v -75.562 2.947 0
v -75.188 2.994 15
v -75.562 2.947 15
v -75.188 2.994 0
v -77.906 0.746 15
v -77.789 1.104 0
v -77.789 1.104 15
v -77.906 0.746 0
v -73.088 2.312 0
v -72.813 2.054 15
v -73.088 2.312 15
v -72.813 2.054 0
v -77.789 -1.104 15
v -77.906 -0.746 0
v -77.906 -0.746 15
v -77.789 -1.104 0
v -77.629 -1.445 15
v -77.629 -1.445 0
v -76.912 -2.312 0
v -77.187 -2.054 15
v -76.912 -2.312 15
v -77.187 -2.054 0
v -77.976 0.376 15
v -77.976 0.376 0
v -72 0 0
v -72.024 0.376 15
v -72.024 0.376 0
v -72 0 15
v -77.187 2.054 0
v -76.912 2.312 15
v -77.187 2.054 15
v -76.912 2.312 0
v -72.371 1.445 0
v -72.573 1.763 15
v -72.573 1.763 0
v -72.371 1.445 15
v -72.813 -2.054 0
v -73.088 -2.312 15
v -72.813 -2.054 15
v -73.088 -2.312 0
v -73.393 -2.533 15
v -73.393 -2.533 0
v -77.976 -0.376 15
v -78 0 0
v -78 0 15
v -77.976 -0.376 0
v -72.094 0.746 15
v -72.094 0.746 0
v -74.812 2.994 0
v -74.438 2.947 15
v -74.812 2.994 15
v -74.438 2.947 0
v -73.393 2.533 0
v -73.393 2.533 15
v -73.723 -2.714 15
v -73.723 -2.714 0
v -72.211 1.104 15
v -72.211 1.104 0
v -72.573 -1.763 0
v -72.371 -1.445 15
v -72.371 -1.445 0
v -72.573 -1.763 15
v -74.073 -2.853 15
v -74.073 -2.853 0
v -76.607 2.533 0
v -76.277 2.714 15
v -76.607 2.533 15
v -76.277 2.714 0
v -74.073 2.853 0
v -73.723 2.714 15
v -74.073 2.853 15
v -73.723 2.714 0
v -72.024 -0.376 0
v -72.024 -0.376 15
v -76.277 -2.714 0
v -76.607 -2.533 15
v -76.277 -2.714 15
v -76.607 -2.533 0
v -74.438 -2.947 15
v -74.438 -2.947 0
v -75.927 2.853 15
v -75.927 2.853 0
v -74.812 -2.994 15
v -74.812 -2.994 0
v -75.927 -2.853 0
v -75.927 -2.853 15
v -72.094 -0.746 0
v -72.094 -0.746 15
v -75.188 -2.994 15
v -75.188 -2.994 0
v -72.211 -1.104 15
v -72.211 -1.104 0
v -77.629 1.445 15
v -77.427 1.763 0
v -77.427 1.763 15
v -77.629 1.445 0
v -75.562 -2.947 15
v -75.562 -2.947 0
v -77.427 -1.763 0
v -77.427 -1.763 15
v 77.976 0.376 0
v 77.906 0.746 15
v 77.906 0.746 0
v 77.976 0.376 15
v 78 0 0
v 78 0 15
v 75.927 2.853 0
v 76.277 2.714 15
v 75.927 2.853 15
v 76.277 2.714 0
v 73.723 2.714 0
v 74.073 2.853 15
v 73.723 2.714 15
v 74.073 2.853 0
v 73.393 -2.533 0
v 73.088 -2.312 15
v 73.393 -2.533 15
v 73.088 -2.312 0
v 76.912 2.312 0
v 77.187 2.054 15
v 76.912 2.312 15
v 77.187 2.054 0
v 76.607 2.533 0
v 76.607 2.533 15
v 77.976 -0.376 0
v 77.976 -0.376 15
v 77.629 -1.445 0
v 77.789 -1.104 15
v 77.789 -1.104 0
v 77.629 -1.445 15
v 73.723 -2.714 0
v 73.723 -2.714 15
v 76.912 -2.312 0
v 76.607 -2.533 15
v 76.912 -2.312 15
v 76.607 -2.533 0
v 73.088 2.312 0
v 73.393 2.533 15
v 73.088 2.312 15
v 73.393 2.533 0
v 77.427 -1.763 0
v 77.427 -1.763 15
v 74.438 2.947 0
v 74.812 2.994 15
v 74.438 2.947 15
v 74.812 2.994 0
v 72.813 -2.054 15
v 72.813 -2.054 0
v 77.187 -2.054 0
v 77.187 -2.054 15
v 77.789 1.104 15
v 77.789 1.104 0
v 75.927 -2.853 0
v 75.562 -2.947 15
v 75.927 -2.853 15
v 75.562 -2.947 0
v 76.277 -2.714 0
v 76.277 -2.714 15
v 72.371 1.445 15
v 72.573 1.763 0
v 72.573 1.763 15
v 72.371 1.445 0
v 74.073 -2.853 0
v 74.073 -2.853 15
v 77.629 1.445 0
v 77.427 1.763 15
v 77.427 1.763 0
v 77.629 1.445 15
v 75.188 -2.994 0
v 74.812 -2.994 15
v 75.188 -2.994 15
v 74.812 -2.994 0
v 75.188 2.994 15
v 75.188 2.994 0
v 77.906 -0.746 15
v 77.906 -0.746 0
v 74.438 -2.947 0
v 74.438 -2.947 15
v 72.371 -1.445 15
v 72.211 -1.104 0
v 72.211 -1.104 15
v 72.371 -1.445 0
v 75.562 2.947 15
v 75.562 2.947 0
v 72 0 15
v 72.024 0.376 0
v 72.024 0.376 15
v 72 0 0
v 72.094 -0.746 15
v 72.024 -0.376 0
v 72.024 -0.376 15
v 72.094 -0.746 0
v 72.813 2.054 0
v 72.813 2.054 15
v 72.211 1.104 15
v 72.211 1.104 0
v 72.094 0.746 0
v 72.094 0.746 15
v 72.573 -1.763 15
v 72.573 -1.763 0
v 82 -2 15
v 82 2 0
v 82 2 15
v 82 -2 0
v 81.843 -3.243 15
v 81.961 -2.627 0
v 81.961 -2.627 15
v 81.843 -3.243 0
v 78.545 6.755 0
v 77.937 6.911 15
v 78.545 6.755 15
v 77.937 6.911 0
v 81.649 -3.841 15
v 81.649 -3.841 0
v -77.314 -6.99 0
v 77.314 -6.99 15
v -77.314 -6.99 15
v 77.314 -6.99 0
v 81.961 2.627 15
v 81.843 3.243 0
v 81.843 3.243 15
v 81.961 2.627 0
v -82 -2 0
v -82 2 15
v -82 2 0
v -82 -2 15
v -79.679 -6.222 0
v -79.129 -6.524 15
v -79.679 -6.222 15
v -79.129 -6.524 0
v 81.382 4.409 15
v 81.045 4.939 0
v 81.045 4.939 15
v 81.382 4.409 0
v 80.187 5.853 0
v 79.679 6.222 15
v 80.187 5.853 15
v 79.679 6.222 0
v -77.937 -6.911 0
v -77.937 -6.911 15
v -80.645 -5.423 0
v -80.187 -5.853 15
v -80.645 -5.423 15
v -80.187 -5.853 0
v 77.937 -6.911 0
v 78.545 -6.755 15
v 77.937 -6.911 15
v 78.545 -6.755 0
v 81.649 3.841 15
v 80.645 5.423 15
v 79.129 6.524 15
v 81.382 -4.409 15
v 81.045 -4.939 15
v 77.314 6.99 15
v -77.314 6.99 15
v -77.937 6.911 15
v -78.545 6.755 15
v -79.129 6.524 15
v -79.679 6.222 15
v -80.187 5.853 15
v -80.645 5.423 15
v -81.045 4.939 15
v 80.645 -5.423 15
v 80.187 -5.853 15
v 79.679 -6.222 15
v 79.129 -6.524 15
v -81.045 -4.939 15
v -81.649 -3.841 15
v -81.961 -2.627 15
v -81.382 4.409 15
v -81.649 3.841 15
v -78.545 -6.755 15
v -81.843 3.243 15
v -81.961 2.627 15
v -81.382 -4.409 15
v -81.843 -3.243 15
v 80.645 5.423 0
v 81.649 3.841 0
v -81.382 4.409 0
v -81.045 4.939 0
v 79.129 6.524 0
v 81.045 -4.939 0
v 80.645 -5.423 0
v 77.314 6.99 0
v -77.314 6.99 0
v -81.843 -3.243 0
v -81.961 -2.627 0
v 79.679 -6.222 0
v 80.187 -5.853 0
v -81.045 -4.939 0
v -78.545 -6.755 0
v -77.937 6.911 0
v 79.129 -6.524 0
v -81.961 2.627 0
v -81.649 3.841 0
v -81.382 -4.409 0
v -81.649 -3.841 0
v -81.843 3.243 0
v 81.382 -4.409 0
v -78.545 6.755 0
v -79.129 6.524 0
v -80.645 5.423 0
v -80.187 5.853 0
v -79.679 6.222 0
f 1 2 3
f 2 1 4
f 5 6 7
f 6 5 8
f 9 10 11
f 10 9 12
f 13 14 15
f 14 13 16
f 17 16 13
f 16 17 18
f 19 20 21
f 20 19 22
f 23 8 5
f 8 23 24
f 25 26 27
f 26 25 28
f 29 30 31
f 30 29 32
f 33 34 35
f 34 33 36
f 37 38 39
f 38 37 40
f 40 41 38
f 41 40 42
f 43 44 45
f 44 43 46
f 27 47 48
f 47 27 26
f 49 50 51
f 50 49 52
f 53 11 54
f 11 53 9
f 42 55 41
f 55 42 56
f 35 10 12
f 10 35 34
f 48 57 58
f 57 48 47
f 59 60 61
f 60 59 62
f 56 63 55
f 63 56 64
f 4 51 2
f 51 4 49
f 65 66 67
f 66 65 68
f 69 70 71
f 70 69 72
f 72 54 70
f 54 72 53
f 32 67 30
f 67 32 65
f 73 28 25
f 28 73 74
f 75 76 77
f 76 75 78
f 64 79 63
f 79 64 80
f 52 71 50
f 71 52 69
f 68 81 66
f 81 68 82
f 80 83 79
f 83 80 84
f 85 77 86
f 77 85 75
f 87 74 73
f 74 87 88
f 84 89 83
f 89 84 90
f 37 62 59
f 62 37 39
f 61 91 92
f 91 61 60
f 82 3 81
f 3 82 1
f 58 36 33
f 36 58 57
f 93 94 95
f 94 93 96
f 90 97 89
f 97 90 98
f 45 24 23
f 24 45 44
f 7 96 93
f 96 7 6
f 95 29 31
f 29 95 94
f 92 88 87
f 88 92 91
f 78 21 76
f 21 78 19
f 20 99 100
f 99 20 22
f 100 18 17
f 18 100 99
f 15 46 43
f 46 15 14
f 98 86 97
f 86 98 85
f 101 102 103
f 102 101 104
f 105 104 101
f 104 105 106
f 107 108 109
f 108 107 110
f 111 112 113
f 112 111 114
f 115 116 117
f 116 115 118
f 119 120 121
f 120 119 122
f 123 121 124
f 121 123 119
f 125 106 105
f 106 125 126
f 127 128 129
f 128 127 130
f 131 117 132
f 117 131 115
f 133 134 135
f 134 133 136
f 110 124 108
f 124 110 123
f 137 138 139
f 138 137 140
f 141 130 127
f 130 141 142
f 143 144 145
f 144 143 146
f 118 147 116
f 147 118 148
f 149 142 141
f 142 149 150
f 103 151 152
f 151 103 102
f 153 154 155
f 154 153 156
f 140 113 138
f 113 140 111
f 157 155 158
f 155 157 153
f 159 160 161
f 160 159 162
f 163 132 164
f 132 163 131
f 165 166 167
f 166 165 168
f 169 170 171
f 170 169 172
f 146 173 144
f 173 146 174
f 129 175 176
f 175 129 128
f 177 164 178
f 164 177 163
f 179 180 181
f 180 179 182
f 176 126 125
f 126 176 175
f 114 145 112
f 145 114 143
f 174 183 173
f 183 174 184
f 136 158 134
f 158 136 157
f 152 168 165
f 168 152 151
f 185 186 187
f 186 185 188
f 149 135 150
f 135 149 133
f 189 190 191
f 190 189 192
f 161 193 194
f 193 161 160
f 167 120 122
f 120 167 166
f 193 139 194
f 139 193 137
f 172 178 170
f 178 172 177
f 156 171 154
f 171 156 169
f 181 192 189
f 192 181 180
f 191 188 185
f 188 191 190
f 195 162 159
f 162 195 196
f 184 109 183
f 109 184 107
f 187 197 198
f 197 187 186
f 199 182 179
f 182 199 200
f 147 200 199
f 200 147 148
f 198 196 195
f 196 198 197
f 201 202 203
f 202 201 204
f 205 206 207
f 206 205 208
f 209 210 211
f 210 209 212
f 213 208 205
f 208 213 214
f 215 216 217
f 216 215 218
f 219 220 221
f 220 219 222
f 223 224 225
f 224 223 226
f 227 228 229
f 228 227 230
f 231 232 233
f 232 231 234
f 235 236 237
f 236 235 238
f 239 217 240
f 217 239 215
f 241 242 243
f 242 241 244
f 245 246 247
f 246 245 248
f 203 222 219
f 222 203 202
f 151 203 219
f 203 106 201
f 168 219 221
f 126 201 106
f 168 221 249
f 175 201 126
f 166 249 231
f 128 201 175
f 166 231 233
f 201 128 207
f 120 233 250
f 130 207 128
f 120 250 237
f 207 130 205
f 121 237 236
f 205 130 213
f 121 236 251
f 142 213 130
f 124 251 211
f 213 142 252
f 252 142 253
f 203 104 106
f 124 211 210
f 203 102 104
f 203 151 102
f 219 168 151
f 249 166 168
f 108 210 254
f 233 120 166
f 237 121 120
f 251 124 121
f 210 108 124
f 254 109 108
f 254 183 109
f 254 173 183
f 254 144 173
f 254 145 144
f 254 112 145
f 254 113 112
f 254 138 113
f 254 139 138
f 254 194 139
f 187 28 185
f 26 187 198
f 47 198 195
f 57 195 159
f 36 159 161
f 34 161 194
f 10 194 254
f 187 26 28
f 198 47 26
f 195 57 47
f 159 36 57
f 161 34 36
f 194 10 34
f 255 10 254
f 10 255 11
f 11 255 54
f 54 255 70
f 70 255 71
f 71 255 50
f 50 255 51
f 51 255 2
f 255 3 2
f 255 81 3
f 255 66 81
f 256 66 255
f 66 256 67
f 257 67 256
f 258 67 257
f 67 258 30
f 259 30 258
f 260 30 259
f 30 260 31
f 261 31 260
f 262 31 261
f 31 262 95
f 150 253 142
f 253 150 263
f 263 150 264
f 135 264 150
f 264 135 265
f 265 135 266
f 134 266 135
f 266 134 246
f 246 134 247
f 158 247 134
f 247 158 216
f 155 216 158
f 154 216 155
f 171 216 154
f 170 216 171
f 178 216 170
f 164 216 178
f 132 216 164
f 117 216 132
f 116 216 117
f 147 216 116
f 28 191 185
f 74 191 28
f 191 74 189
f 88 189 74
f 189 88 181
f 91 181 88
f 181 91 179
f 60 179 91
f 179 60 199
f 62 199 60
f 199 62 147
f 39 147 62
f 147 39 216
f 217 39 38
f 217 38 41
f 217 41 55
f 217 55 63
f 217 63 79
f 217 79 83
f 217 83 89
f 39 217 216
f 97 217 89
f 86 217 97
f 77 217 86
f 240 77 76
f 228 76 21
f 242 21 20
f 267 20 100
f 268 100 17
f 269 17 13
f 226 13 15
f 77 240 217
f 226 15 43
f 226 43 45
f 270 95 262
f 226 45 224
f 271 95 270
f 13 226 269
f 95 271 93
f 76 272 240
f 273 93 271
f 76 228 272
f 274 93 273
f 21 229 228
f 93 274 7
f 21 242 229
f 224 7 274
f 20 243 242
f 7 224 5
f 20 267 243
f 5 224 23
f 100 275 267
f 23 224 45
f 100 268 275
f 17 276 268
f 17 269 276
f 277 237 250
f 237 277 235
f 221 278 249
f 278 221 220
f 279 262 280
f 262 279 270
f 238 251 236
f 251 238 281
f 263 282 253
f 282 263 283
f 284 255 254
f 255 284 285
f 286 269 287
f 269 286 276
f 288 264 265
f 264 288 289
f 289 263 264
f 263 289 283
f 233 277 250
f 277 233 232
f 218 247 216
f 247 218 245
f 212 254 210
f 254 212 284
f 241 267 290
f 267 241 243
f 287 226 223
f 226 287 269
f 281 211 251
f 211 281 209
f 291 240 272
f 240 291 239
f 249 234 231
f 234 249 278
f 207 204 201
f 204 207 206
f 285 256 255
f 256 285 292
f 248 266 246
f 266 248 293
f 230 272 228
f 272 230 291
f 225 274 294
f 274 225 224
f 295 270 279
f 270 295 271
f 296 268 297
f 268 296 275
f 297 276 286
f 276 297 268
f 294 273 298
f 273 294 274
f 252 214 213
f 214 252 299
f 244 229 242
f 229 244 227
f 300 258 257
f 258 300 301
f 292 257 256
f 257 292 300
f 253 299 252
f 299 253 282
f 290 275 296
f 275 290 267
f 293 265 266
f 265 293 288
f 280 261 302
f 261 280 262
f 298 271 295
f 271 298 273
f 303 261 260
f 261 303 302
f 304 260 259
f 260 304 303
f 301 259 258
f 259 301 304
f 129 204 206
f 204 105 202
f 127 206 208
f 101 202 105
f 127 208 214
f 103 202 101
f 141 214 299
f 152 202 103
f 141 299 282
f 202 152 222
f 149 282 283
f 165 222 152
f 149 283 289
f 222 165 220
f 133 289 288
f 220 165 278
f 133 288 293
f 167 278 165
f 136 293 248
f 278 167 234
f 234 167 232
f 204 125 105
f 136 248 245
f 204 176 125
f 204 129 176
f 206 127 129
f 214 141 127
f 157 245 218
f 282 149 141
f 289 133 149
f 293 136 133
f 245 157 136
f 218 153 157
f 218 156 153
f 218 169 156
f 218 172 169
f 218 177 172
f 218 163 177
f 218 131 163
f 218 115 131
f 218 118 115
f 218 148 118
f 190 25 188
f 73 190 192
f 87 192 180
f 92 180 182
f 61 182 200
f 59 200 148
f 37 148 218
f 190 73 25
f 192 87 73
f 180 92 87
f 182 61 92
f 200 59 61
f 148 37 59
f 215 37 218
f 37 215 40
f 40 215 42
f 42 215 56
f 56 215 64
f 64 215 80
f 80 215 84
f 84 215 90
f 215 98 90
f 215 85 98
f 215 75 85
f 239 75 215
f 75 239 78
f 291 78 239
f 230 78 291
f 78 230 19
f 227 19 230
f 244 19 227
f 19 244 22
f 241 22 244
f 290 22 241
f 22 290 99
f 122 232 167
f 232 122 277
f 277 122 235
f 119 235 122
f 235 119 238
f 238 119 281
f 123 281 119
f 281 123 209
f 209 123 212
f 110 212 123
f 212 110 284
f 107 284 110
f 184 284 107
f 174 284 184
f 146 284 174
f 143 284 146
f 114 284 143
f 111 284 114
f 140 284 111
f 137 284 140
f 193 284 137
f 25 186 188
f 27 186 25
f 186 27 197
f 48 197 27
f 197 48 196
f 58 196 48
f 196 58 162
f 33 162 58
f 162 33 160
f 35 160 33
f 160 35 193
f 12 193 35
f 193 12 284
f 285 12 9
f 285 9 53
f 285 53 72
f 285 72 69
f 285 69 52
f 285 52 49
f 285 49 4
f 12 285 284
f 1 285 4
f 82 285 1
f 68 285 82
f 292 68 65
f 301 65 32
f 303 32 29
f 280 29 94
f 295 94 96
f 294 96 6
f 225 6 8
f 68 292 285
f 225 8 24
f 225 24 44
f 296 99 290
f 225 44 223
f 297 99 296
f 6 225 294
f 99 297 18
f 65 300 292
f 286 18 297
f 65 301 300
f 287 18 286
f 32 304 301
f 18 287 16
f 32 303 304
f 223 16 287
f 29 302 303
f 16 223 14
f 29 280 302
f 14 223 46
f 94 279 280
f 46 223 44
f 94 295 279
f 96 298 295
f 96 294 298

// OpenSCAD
$fn = 50;


difference() {
	union() {
		hull() {
			translate(v = [-77.0000000000, 2.0000000000, 0]) {
				cylinder(h = 15, r = 5);
			}
			translate(v = [77.0000000000, 2.0000000000, 0]) {
				cylinder(h = 15, r = 5);
			}
			translate(v = [-77.0000000000, -2.0000000000, 0]) {
				cylinder(h = 15, r = 5);
			}
			translate(v = [77.0000000000, -2.0000000000, 0]) {
				cylinder(h = 15, r = 5);
			}
		}
	}
	union() {
		translate(v = [-75.0000000000, 0.0000000000, -100.0000000000]) {
			cylinder(h = 200, r = 3.0000000000);
		}
		translate(v = [-75.0000000000, 0.0000000000, -100.0000000000]) {
			cylinder(h = 200, r = 3.0000000000);
		}
		translate(v = [75.0000000000, 0.0000000000, -100.0000000000]) {
			cylinder(h = 200, r = 3.0000000000);
		}
		translate(v = [75.0000000000, 0.0000000000, -100.0000000000]) {
			cylinder(h = 200, r = 3.0000000000);
		}
	}
}
